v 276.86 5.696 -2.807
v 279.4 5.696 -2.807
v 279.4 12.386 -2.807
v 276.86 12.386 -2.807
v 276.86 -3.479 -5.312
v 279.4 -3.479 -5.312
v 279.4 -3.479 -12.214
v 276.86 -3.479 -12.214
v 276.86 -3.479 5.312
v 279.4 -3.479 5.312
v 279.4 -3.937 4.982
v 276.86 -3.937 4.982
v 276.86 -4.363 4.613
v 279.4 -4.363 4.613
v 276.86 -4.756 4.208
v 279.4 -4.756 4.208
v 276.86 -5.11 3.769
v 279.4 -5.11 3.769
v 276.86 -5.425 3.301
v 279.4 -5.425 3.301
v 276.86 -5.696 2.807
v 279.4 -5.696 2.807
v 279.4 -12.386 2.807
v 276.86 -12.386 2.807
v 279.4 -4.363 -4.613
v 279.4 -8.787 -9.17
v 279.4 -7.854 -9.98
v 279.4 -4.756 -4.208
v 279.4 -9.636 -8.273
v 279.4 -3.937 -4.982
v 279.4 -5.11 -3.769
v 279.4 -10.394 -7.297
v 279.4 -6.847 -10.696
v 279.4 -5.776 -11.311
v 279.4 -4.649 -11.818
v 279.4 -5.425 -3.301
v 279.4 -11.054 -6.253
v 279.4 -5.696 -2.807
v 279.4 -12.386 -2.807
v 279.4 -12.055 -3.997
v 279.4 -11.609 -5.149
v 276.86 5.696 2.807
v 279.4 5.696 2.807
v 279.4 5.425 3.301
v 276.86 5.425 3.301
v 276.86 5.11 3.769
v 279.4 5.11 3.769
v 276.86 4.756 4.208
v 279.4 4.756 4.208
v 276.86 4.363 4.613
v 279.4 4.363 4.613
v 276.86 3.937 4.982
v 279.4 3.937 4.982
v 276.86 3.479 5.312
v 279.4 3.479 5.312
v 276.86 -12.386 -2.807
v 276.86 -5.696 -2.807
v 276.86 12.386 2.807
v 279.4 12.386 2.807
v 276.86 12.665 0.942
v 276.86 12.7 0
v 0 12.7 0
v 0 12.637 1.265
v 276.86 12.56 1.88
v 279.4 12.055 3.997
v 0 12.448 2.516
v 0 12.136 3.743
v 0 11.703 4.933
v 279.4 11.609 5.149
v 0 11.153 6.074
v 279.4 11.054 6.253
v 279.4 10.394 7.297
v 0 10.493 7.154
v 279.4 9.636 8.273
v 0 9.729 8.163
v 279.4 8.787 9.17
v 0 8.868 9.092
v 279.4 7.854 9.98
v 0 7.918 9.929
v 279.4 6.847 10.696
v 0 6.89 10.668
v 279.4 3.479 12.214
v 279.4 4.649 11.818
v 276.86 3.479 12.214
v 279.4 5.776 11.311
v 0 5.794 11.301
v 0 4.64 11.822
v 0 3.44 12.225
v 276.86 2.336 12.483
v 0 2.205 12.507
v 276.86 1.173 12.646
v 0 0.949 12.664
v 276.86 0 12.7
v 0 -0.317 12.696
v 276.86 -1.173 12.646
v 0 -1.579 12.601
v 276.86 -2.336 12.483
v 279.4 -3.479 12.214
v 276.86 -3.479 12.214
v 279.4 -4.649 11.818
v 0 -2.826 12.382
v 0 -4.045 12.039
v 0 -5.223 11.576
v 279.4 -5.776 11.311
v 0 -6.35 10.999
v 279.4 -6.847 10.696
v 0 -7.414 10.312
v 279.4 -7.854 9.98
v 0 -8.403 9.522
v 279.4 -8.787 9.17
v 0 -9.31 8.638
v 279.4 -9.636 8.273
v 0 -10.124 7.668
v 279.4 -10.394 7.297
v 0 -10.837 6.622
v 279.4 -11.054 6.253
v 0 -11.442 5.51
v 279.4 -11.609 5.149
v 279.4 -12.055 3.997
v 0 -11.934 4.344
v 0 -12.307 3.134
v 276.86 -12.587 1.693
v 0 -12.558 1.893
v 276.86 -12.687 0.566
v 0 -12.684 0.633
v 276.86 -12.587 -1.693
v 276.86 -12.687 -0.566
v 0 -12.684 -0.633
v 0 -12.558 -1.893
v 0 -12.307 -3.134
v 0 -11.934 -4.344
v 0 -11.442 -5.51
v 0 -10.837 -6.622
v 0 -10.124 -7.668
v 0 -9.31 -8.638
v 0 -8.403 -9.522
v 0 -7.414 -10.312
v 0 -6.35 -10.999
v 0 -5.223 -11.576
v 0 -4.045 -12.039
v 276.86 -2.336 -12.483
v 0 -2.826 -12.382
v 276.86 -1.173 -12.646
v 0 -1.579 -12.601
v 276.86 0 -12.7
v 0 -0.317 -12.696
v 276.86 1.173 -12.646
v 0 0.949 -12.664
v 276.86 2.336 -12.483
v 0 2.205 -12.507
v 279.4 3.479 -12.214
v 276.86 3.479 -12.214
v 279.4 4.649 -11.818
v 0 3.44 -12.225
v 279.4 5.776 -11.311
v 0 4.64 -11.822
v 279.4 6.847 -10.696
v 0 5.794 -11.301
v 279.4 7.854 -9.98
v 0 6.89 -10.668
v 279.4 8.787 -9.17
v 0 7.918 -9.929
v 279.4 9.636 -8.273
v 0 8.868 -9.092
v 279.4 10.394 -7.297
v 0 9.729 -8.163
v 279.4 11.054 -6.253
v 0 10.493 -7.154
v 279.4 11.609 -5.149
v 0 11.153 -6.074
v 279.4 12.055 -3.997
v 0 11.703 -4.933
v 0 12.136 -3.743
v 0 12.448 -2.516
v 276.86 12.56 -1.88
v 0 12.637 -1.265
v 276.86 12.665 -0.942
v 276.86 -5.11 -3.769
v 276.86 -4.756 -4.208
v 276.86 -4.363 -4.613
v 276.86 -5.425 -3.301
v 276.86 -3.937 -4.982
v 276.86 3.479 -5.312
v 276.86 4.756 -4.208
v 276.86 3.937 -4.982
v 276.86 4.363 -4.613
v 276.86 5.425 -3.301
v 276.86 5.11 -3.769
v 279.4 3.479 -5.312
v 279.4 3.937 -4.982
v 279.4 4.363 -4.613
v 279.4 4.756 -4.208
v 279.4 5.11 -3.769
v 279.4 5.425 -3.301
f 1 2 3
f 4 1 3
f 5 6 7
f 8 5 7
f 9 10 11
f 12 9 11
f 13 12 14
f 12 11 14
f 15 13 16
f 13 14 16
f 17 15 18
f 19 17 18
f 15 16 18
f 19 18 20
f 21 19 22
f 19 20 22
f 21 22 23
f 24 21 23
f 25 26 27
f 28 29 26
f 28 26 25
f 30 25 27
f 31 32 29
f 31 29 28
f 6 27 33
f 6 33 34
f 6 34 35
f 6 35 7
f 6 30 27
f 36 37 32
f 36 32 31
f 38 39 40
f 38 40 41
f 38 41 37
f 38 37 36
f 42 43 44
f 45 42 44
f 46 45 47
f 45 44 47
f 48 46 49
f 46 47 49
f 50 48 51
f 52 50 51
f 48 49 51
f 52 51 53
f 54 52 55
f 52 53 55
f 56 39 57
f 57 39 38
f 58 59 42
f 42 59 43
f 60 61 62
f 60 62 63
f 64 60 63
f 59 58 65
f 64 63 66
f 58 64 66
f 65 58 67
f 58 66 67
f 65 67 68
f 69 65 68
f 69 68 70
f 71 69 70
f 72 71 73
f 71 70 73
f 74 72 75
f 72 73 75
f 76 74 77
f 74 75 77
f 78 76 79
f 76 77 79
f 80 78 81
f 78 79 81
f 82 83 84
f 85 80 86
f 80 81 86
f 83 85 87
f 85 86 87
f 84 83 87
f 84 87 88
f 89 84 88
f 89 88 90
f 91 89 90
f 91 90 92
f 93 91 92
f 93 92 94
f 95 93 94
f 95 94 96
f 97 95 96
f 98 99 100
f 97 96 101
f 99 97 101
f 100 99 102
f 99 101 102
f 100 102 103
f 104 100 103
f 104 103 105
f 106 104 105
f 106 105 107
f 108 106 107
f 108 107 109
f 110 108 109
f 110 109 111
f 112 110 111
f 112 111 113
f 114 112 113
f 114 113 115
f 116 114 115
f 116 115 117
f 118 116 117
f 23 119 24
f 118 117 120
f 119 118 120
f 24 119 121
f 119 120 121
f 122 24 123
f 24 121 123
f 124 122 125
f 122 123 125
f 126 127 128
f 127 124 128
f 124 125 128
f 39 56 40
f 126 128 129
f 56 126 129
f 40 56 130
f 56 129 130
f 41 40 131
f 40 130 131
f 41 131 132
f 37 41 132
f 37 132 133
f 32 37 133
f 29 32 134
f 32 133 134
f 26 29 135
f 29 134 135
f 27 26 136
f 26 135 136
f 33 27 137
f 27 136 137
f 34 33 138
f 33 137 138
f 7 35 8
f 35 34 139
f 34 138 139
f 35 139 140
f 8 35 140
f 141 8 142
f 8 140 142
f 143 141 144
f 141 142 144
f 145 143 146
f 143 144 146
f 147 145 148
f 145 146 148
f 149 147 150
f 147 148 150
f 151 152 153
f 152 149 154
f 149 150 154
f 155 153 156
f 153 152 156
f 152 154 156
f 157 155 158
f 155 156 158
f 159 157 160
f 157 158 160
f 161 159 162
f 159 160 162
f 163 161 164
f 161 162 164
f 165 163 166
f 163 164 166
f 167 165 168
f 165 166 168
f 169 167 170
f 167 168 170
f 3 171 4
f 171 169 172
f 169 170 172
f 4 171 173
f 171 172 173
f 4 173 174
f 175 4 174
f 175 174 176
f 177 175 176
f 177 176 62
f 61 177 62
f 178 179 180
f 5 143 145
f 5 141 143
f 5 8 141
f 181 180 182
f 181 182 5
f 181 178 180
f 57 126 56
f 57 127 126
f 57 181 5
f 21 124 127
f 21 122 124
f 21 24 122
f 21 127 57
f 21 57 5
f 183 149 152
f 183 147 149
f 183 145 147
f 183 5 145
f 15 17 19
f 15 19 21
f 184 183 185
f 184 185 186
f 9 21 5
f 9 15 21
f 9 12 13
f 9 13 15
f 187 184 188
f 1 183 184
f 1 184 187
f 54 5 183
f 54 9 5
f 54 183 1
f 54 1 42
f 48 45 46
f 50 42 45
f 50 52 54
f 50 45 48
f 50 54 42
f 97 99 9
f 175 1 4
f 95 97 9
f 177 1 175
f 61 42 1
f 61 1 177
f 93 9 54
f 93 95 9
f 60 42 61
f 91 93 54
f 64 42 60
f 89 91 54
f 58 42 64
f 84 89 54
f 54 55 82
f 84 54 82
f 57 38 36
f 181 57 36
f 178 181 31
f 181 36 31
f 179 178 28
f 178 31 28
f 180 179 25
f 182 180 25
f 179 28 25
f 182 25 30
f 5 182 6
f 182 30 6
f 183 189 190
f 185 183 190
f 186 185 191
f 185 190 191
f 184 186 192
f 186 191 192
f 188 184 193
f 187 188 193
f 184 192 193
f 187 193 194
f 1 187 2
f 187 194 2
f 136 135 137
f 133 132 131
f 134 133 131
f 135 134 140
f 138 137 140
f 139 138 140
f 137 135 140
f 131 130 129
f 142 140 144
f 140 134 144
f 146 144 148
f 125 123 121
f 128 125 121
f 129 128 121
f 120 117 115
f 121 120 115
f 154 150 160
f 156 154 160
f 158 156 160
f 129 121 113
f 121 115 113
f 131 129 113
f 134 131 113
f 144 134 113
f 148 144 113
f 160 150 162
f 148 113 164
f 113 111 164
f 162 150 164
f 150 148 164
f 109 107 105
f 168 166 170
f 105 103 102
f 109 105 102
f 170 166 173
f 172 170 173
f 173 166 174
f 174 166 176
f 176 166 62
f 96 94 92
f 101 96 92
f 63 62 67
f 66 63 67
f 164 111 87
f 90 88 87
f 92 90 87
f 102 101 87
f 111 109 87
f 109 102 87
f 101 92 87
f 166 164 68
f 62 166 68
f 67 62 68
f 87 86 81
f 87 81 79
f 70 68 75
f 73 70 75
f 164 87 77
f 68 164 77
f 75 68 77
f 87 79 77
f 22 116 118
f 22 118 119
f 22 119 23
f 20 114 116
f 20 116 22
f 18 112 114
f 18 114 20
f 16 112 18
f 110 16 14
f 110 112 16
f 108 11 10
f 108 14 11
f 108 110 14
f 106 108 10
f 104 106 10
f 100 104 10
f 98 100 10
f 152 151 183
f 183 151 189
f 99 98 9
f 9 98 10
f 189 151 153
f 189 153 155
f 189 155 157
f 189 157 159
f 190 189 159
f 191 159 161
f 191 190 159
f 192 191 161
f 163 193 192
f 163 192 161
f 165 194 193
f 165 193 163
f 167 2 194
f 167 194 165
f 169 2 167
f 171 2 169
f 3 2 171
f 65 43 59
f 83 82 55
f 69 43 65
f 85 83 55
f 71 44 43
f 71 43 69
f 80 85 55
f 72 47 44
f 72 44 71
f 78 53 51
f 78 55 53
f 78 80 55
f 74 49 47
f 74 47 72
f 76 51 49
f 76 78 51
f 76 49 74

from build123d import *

# Parameters (mm, degrees)
F0_R     = 12.7
F1_DEPTH = 279.4
F3_DEPTH = 2.54


with BuildPart() as f1:
    # F0 (on Right) → F1 (new body)
    with BuildSketch(Plane.YZ):
        Circle(F0_R)
    extrude(amount=F1_DEPTH)

    # F2 (on face) → F3 (cut)
    with BuildSketch(Plane.YZ.offset(279.4)):
        with BuildLine():
            ThreePointArc((5.696123, -2.806543), (6.184371, -1.440854), (6.35, 0))
            ThreePointArc((6.35, 0), (6.184371, 1.440854), (5.696123, 2.806543))
            ThreePointArc((5.696123, 2.806543), (4.755533, 4.208017), (3.478958, 5.312189))
            ThreePointArc((3.478958, 5.312189), (0, 6.35), (-3.478958, 5.312189))
            ThreePointArc((-3.478958, 5.312189), (-4.755533, 4.208017), (-5.696123, 2.806543))
            ThreePointArc((-5.696123, 2.806543), (-6.35, 0), (-5.696123, -2.806543))
            ThreePointArc((-5.696123, -2.806543), (-4.755533, -4.208017), (-3.478958, -5.312189))
            ThreePointArc((-3.478958, -5.312189), (0, -6.35), (3.478958, -5.312189))
            ThreePointArc((3.478958, -5.312189), (4.755533, -4.208017), (5.696123, -2.806543))
        make_face()
        with BuildLine():
            ThreePointArc((5.696123, 2.806543), (6.184371, 1.440854), (6.35, 0))
            ThreePointArc((6.35, 0), (6.184371, -1.440854), (5.696123, -2.806543))
            Line((5.696123, -2.806543), (28.013255, -2.806543))
            Line((28.013255, -2.806543), (28.013255, 0))
            Line((28.013255, 0), (28.013255, 2.806543))
            Line((28.013255, 2.806543), (5.696123, 2.806543))
        make_face()
        with BuildLine():
            ThreePointArc((-3.478958, 5.312189), (0, 6.35), (3.478958, 5.312189))
            Line((3.478958, 5.312189), (3.478958, 26.45749))
            Line((3.478958, 26.45749), (0, 26.45749))
            Line((0, 26.45749), (-3.478958, 26.45749))
            Line((-3.478958, 26.45749), (-3.478958, 5.312189))
        make_face()
        with BuildLine():
            Line((3.478958, -31.876493), (3.478958, -5.312189))
            ThreePointArc((3.478958, -5.312189), (0, -6.35), (-3.478958, -5.312189))
            Line((-3.478958, -5.312189), (-3.478958, -31.876493))
            Line((-3.478958, -31.876493), (0, -31.876493))
            Line((0, -31.876493), (3.478958, -31.876493))
        make_face()
        with BuildLine():
            ThreePointArc((-5.696123, -2.806543), (-6.35, 0), (-5.696123, 2.806543))
            Line((-5.696123, 2.806543), (-29.619023, 2.806543))
            Line((-29.619023, 2.806543), (-29.619023, 0))
            Line((-29.619023, 0), (-29.619023, -2.806543))
            Line((-29.619023, -2.806543), (-5.696123, -2.806543))
        make_face()
    extrude(amount=-F3_DEPTH, mode=Mode.SUBTRACT)


solid = f1.part
